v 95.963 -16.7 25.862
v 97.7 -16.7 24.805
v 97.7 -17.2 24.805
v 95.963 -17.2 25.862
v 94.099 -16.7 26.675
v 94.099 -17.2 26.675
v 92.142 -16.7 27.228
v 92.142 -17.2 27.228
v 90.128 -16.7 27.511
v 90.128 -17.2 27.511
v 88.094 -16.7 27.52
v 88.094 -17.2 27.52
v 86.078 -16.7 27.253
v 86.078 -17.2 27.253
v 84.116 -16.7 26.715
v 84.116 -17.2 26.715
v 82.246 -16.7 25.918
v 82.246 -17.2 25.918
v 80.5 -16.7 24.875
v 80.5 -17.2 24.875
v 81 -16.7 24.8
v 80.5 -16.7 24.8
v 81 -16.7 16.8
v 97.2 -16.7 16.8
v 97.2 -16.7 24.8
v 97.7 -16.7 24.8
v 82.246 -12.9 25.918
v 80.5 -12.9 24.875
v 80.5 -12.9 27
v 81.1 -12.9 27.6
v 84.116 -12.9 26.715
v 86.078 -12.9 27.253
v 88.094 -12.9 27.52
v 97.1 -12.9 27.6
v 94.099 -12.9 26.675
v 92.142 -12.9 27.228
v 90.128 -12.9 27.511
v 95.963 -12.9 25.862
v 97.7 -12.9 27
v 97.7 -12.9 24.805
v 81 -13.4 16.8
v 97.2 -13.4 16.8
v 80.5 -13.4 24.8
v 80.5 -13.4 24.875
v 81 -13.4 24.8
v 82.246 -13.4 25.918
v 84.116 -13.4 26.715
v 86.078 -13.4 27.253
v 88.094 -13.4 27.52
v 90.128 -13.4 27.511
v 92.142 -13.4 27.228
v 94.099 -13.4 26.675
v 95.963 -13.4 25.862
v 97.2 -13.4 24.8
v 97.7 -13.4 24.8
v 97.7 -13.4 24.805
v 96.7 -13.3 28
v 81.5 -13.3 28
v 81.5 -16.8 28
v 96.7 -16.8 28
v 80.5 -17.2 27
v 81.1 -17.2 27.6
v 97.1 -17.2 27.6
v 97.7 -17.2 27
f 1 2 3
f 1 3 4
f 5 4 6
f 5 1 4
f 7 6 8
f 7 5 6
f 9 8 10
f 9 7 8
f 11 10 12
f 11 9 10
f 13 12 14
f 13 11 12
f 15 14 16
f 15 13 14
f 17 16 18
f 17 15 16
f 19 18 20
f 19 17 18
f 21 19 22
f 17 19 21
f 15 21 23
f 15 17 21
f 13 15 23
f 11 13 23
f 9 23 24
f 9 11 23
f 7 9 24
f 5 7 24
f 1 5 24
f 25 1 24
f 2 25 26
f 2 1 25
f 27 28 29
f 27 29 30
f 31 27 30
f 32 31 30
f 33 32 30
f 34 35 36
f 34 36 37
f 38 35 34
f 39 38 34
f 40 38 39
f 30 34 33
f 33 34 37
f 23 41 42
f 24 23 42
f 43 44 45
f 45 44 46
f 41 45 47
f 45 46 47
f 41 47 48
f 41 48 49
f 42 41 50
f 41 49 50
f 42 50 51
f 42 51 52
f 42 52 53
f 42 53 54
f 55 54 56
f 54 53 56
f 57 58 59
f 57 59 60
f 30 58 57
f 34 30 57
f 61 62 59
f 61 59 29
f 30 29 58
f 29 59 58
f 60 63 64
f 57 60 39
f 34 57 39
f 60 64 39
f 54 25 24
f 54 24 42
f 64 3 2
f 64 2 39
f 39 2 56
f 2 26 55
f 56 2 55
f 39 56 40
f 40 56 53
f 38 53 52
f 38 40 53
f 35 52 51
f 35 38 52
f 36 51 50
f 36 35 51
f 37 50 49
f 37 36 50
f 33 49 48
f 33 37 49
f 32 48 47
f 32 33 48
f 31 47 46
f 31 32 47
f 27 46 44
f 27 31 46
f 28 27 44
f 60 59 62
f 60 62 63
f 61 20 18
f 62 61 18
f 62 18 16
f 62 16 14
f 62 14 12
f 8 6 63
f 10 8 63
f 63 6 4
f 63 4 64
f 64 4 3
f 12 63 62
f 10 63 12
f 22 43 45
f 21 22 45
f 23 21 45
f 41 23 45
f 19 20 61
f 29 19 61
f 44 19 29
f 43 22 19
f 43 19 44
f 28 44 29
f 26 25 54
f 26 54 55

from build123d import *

# Parameters (mm, degrees)
SKETCH009_R         = 15
EXTRUDE003006_DEPTH = 0.5
SKETCH008_R         = 15
EXTRUDE003005_DEPTH = 0.5
BOX021_W            = 17.2
BOX021_H            = 4.3
BOX021_DEPTH        = 3.2
BOX020_W            = 16.2
BOX020_H            = 3.3
BOX020_DEPTH        = 8
CHAMFER002_SIZE     = 1
CHAMFER003_SIZE     = 0.4


with BuildPart() as extrude003006:
    # Sketch009 → Extrude003006 (new body)
    with BuildSketch(Plane.XZ):
        with Locations((89, 10.4)):
            Circle(SKETCH009_R)
    extrude(amount=EXTRUDE003006_DEPTH)


with BuildPart() as extrude003006_1:
    # Extrude003006 placement: moved
    add(extrude003006.part.moved(Location((0.05, -23.2, 0.15))))


with BuildPart() as extrude003005:
    # Sketch008 → Extrude003005 (new body)
    with BuildSketch(Plane.XZ):
        with Locations((89, 10.4)):
            Circle(SKETCH008_R)
    extrude(amount=EXTRUDE003005_DEPTH)


with BuildPart() as extrude003005_1:
    # Extrude003005 placement: moved
    add(extrude003005.part.moved(Location((0.05, -27, 0.15))))


with BuildPart() as tapa_puerta005:
    # Box021 → Box021 (new body)
    with BuildSketch(Plane(origin=(80.5, -27.5, 22.8), x_dir=(1, 0, 0), z_dir=(0, 0, 1))):
        with Locations((8.6, 2.15)):
            Rectangle(BOX021_W, BOX021_H)
    extrude(amount=BOX021_DEPTH)


with BuildPart() as tapa_pared:
    # Box020 → Box020 (new body)
    with BuildSketch(Plane(origin=(81, -27, 14.8), x_dir=(1, 0, 0), z_dir=(0, 0, 1))):
        with Locations((8.1, 1.65)):
            Rectangle(BOX020_W, BOX020_H)
    extrude(amount=BOX020_DEPTH)

    # Fusion009: union tapa_puerta005
    add(tapa_puerta005.part)

    # Cut005014017: cut Extrude003005
    add(extrude003005_1.part, mode=Mode.SUBTRACT)

    # Cut005014018: cut Extrude003006
    add(extrude003006_1.part, mode=Mode.SUBTRACT)

    # Chamfer002
    chamfer002_edges = [tapa_pared.edges().sort_by_distance(p)[0] for p in [
        (80.5, -25.35, 26),
        (97.7, -25.35, 26),
    ]]
    chamfer(chamfer002_edges, length=CHAMFER002_SIZE)

    # Chamfer003
    chamfer003_edges = [tapa_pared.edges().sort_by_distance(p)[0] for p in [
        (89.1, -27.5, 26),
        (89.1, -23.2, 26),
    ]]
    chamfer(chamfer003_edges, length=CHAMFER003_SIZE)


with BuildPart() as tapa_pared_1:
    # Chamfer003 placement: moved
    add(tapa_pared.part.moved(Location((0, 10.3, 2))))


solid = tapa_pared_1.part
